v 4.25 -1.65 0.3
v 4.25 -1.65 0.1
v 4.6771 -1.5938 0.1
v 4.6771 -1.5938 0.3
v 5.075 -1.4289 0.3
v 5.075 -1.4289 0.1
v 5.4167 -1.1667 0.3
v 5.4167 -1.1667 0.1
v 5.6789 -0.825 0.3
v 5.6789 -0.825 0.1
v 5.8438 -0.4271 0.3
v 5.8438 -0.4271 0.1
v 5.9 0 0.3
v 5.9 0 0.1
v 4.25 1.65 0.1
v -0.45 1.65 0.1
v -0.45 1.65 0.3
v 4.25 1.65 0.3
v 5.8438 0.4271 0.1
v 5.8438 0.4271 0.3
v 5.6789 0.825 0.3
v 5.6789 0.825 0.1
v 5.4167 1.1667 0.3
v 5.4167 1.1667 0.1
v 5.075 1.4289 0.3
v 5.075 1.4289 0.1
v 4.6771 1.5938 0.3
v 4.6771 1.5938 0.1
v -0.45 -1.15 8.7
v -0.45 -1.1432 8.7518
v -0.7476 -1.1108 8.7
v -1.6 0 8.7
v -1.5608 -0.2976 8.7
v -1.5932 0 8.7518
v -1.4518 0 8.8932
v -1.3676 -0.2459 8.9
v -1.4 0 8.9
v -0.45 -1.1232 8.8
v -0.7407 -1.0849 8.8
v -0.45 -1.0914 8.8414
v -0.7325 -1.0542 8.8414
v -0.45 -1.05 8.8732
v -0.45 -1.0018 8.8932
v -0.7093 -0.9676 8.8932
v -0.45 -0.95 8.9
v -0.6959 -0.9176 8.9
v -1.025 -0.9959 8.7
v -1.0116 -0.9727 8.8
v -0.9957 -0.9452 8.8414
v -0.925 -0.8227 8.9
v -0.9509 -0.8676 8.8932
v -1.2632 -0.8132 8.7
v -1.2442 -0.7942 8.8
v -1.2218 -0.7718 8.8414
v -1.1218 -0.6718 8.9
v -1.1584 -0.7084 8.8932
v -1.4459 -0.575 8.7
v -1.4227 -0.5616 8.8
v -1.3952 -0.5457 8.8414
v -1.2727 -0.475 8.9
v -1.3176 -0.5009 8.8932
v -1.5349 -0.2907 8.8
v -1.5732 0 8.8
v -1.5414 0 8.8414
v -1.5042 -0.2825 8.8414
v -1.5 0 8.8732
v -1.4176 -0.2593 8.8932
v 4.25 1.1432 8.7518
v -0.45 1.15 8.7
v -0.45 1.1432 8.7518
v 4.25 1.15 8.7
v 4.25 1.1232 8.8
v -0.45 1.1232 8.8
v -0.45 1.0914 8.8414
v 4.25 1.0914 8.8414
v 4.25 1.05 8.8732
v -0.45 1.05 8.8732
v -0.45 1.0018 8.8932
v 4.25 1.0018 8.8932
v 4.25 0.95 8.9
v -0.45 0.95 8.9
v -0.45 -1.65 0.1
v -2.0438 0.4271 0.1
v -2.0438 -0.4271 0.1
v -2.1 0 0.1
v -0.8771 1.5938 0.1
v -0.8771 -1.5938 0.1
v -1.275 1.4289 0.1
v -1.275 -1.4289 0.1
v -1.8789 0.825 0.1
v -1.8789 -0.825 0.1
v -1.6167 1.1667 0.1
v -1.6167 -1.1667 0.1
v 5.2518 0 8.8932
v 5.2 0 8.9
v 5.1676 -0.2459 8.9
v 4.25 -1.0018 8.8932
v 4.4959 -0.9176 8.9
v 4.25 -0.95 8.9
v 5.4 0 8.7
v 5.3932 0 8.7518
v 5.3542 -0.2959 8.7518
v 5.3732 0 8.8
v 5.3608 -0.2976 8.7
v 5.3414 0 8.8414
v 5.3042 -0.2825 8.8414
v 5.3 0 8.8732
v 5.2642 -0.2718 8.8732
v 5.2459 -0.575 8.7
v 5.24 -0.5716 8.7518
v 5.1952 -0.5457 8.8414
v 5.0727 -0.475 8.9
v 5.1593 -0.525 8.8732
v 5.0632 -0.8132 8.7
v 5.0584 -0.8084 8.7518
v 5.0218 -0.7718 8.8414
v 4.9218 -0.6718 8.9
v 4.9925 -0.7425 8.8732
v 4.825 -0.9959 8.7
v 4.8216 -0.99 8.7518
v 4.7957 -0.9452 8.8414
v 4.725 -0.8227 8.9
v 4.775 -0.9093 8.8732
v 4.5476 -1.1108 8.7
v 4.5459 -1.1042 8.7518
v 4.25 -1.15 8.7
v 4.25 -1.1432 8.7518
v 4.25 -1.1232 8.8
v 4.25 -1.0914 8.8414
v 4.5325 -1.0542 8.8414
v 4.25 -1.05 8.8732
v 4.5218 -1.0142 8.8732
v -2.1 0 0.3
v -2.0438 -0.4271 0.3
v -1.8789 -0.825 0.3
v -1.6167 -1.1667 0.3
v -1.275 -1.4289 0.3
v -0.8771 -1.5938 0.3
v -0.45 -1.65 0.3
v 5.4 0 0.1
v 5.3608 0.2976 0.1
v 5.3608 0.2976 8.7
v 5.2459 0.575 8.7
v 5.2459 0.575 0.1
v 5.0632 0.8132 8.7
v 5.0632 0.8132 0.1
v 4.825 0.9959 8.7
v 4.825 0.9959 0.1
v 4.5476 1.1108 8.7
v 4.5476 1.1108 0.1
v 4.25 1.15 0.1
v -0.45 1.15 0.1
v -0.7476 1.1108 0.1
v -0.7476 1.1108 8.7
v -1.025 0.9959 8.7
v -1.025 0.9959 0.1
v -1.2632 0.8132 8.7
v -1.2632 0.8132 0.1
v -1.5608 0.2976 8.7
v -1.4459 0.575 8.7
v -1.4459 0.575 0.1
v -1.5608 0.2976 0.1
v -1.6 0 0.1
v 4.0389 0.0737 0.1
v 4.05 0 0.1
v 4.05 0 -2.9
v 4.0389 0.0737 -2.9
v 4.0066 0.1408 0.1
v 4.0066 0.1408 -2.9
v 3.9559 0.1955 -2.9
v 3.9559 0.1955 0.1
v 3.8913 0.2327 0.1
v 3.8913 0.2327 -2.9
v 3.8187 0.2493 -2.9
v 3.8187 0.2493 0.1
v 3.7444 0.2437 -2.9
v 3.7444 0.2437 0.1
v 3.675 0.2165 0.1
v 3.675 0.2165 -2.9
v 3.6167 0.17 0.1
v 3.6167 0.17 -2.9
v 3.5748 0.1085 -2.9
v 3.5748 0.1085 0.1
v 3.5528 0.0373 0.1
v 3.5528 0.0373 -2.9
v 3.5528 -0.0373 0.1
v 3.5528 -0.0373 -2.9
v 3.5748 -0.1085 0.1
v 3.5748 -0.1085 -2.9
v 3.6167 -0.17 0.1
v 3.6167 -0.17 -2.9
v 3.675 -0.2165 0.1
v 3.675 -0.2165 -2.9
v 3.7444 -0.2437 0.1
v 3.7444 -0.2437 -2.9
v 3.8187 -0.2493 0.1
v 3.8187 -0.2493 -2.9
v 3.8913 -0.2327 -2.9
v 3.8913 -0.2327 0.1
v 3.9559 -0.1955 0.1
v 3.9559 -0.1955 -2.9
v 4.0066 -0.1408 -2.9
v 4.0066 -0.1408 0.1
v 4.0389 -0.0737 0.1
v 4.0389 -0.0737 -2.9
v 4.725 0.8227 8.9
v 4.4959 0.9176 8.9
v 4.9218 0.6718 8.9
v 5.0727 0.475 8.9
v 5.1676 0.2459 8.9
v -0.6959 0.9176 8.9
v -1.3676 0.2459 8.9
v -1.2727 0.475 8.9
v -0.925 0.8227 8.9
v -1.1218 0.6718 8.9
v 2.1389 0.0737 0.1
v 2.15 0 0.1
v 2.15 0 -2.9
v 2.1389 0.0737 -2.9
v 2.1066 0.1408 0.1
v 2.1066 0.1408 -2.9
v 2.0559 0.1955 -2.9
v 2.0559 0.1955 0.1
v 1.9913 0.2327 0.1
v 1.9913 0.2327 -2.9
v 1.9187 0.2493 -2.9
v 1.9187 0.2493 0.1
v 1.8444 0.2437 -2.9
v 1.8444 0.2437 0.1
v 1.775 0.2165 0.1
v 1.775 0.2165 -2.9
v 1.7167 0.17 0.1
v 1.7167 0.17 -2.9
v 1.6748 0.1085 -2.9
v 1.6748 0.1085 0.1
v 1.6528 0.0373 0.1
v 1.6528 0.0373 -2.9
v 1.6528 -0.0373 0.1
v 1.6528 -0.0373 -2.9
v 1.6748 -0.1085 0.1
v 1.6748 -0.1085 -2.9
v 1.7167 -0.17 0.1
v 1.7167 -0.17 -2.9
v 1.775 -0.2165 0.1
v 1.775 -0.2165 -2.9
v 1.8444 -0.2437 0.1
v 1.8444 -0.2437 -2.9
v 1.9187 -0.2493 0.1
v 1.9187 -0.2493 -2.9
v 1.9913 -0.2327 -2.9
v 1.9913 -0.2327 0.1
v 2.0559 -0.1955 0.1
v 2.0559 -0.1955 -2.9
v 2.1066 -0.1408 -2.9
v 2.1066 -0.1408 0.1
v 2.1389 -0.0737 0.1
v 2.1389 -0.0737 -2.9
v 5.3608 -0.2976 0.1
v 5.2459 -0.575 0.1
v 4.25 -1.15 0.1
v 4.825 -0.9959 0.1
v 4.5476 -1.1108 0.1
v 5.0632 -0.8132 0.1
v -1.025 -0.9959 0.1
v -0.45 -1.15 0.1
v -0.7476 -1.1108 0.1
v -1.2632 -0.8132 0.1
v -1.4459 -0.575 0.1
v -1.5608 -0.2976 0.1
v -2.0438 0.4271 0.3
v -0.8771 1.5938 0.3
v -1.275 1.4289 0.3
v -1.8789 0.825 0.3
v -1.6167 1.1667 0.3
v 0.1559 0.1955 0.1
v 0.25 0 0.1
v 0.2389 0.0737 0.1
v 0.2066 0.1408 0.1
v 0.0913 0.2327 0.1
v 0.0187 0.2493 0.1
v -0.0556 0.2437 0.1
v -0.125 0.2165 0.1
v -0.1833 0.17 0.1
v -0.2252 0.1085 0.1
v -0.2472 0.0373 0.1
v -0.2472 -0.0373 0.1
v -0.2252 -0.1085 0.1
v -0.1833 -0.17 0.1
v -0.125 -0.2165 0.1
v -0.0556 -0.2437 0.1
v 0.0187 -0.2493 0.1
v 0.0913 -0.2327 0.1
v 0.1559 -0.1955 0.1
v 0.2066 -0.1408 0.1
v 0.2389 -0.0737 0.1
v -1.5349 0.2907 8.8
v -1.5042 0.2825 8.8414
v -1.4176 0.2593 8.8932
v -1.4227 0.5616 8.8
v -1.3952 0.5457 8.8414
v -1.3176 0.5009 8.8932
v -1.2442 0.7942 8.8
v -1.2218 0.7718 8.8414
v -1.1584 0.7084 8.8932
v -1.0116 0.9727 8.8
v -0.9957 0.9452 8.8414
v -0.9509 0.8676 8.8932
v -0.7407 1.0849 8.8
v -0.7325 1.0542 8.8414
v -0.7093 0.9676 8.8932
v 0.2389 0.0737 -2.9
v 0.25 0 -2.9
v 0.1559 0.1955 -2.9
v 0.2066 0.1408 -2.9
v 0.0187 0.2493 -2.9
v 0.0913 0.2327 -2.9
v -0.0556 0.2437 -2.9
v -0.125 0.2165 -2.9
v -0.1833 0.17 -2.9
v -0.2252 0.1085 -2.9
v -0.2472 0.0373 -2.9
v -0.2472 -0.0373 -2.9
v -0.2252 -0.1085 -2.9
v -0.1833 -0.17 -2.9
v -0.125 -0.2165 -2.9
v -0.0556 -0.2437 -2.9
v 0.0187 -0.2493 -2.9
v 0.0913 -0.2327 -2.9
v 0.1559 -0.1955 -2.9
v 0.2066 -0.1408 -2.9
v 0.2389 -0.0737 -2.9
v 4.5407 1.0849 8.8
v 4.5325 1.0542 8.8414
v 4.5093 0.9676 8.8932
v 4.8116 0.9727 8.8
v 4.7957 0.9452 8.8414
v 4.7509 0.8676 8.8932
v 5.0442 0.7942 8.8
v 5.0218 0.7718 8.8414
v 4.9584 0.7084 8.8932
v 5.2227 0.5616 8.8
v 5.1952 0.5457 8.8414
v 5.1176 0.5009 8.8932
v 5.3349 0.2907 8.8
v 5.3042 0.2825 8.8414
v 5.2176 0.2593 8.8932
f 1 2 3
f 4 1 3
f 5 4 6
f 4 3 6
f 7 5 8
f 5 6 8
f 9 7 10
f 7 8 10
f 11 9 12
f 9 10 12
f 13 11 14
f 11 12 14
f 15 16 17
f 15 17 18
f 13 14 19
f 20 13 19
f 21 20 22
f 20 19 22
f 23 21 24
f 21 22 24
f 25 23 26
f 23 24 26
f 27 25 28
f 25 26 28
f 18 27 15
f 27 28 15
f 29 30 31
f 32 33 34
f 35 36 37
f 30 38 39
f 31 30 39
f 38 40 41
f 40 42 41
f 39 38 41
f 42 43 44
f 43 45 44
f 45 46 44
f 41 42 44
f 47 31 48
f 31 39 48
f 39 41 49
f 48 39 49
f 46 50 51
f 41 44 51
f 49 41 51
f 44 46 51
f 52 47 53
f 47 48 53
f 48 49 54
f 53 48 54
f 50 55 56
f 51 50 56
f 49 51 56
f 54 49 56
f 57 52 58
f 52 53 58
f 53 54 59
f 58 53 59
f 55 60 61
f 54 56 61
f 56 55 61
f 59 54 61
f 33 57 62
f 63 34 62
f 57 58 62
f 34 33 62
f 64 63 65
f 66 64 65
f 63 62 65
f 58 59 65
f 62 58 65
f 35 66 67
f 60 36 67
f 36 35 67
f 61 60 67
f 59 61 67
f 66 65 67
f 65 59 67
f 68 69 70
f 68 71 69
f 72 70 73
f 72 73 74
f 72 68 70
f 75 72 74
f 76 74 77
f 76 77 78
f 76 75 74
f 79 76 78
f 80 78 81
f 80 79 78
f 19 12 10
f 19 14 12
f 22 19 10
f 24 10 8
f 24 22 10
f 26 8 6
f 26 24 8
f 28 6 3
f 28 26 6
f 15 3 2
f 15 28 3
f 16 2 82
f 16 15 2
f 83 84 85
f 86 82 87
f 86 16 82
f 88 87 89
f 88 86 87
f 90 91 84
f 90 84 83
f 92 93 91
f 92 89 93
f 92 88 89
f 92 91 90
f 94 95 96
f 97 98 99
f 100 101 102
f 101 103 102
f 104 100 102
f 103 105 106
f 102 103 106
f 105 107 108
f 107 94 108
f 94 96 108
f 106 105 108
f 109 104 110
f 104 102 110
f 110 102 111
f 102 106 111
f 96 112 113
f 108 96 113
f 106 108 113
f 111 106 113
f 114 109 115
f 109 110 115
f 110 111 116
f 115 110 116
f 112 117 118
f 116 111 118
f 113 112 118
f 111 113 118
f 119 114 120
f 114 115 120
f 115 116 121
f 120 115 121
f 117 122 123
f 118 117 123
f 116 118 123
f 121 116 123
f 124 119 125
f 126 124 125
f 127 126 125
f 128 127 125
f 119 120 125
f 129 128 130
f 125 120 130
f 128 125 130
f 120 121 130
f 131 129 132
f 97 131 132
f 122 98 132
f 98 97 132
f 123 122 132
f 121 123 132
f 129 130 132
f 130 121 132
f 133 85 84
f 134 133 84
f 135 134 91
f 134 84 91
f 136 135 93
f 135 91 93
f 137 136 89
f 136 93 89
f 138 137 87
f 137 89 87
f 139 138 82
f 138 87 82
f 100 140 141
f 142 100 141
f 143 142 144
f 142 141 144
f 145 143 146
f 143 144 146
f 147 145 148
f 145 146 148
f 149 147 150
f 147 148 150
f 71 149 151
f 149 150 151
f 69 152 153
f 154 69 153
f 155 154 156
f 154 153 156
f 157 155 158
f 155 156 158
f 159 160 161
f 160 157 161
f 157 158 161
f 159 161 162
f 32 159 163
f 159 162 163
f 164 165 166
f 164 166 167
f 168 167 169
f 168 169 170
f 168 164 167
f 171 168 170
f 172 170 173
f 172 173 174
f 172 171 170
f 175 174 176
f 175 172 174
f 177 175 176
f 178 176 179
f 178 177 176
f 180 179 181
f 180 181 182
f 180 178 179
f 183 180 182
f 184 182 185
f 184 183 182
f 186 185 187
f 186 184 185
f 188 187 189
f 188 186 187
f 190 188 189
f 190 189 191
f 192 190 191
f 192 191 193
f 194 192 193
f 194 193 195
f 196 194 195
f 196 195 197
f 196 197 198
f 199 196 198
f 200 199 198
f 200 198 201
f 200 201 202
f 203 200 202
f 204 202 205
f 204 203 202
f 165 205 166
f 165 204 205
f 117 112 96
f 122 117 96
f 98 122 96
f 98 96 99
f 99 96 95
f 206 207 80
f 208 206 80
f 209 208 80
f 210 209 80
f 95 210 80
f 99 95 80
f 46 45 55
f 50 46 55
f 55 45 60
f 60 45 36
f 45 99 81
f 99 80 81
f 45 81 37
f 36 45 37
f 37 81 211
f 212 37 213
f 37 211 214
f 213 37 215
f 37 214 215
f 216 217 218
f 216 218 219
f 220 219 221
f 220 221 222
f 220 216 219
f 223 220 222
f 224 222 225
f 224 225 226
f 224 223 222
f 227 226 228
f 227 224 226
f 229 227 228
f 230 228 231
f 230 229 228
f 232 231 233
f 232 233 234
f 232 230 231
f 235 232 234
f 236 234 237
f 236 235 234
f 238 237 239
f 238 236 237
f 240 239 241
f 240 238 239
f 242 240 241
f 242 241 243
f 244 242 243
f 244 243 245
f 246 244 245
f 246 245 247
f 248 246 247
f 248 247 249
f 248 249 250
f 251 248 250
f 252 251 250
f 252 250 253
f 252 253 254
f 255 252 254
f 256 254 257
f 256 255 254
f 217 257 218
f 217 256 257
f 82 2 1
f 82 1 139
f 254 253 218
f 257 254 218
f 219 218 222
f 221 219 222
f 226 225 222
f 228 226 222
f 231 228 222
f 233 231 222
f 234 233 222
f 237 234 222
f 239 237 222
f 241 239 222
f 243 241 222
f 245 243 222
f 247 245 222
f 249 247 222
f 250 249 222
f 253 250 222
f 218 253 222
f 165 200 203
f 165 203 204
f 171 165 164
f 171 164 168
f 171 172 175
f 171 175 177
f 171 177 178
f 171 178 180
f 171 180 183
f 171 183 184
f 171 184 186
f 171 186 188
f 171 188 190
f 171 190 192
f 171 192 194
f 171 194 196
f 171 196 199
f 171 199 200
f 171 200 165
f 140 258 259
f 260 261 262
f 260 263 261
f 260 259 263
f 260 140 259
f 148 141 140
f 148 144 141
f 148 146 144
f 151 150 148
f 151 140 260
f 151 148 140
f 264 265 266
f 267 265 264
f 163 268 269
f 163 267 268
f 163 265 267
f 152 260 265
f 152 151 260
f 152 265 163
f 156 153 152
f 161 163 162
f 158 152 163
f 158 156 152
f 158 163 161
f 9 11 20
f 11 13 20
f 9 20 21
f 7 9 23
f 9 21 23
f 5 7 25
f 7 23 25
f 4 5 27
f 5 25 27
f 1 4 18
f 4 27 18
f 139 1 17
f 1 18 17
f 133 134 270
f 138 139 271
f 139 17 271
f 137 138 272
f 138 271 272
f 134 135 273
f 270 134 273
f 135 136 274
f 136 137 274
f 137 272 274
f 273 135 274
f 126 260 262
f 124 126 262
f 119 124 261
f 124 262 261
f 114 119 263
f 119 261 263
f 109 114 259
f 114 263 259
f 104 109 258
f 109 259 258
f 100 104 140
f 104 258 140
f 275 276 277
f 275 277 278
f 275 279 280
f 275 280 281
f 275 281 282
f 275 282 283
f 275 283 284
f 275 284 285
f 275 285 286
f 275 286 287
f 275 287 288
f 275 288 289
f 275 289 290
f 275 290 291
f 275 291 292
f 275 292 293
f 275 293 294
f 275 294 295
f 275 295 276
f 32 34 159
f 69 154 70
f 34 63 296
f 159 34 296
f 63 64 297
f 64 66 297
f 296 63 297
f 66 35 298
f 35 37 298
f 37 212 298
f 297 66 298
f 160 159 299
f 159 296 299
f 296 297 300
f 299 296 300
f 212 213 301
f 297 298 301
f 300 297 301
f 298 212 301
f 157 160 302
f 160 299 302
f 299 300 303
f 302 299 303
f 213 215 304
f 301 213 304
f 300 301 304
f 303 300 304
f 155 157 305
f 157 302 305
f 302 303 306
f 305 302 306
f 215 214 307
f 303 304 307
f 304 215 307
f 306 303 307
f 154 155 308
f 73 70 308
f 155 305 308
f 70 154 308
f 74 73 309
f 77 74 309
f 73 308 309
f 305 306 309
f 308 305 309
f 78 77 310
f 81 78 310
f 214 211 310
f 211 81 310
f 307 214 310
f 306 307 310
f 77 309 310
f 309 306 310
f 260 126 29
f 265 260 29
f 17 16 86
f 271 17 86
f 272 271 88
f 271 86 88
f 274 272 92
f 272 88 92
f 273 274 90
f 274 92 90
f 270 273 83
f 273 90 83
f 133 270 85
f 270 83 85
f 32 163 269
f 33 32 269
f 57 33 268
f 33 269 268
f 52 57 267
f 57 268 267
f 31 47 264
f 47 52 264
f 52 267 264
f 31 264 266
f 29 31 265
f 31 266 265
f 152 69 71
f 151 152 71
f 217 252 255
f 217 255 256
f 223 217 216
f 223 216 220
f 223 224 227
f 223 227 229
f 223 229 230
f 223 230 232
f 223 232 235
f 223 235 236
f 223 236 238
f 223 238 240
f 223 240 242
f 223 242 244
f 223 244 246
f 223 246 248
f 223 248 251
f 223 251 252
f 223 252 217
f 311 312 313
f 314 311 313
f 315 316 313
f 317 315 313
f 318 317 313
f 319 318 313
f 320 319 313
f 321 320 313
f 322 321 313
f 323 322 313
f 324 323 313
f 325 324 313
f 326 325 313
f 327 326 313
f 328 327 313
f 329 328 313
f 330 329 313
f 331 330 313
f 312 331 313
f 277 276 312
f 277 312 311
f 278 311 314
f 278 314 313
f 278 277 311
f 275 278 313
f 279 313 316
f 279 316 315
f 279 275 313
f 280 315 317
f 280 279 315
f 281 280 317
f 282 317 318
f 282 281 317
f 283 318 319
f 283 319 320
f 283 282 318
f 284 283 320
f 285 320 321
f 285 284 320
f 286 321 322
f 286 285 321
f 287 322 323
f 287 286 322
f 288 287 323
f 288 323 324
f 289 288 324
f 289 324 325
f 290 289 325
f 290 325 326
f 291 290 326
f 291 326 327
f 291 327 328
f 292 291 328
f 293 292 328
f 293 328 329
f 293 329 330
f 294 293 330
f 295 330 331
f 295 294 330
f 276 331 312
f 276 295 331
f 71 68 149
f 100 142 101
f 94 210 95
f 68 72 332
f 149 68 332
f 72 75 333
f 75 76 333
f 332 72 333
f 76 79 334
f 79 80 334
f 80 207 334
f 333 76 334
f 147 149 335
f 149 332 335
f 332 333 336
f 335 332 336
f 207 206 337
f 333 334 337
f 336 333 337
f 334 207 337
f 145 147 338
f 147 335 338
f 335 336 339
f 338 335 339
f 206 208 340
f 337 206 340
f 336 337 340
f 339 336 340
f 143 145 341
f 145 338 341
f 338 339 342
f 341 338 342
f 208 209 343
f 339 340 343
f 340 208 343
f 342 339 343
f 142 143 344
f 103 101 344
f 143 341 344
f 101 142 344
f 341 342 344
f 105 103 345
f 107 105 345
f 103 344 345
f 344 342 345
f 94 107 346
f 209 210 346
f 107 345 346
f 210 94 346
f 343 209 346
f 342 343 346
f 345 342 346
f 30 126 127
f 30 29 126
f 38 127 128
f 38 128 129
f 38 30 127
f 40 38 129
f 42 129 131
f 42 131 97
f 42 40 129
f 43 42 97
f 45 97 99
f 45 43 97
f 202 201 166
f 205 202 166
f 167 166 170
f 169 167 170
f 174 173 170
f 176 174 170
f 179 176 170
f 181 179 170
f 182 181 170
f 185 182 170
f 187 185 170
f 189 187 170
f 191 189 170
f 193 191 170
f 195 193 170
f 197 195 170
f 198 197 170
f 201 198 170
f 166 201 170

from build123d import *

# Parameters (mm, degrees)
SKETCH_R     = 0.25
PAD_DEPTH    = 3
PAD001_DEPTH = 0.2
PAD002_DEPTH = 8.8
FILLET_R     = 0.2


with BuildPart() as pad:
    # Sketch → Pad (new body)
    with BuildSketch(Plane.XY.offset(0.1)):
        Circle(SKETCH_R)
        with Locations((3.8, 0)):
            Circle(SKETCH_R)
        with Locations((1.9, 0)):
            Circle(SKETCH_R)
    extrude(amount=-PAD_DEPTH)


with BuildPart() as pad001:
    # Sketch001 → Pad001 (new body)
    with BuildSketch(Plane.XY.offset(0.1)):
        with BuildLine():
            Line((-0.45, 1.65), (4.25, 1.65))
            ThreePointArc((5.9, 0), (5.416726, 1.166726), (4.25, 1.65))
            ThreePointArc((4.25, -1.65), (5.416726, -1.166726), (5.9, 0))
            Line((4.25, -1.65), (-0.45, -1.65))
            ThreePointArc((-2.1, 0), (-1.616726, -1.166726), (-0.45, -1.65))
            ThreePointArc((-0.45, 1.65), (-1.616726, 1.166726), (-2.1, 0))
        make_face()
    extrude(amount=PAD001_DEPTH)


with BuildPart() as fillet_body:
    # Sketch003 → Pad002 (new body)
    with BuildSketch(Plane.XY.offset(0.1)):
        with BuildLine():
            Line((-0.45, 1.15), (4.25, 1.15))
            ThreePointArc((5.4, 0), (5.063173, 0.813173), (4.25, 1.15))
            ThreePointArc((4.25, -1.15), (5.063173, -0.813173), (5.4, 0))
            Line((4.25, -1.15), (-0.45, -1.15))
            ThreePointArc((-1.6, 0), (-1.263173, -0.813173), (-0.45, -1.15))
            ThreePointArc((-0.45, 1.15), (-1.263173, 0.813173), (-1.6, 0))
        make_face()
    extrude(amount=PAD002_DEPTH)

    # Fillet
    fillet_edges = [fillet_body.edges().sort_by_distance(p)[0] for p in [
        (1.9, 1.15, 8.9),
        (-1.263173, 0.813173, 8.9),
        (-1.263173, -0.813173, 8.9),
        (1.9, -1.15, 8.9),
        (5.063173, -0.813173, 8.9),
        (5.063173, 0.813173, 8.9),
    ]]
    fillet(fillet_edges, radius=FILLET_R)


solid = Compound([pad.part, pad001.part, fillet_body.part])
